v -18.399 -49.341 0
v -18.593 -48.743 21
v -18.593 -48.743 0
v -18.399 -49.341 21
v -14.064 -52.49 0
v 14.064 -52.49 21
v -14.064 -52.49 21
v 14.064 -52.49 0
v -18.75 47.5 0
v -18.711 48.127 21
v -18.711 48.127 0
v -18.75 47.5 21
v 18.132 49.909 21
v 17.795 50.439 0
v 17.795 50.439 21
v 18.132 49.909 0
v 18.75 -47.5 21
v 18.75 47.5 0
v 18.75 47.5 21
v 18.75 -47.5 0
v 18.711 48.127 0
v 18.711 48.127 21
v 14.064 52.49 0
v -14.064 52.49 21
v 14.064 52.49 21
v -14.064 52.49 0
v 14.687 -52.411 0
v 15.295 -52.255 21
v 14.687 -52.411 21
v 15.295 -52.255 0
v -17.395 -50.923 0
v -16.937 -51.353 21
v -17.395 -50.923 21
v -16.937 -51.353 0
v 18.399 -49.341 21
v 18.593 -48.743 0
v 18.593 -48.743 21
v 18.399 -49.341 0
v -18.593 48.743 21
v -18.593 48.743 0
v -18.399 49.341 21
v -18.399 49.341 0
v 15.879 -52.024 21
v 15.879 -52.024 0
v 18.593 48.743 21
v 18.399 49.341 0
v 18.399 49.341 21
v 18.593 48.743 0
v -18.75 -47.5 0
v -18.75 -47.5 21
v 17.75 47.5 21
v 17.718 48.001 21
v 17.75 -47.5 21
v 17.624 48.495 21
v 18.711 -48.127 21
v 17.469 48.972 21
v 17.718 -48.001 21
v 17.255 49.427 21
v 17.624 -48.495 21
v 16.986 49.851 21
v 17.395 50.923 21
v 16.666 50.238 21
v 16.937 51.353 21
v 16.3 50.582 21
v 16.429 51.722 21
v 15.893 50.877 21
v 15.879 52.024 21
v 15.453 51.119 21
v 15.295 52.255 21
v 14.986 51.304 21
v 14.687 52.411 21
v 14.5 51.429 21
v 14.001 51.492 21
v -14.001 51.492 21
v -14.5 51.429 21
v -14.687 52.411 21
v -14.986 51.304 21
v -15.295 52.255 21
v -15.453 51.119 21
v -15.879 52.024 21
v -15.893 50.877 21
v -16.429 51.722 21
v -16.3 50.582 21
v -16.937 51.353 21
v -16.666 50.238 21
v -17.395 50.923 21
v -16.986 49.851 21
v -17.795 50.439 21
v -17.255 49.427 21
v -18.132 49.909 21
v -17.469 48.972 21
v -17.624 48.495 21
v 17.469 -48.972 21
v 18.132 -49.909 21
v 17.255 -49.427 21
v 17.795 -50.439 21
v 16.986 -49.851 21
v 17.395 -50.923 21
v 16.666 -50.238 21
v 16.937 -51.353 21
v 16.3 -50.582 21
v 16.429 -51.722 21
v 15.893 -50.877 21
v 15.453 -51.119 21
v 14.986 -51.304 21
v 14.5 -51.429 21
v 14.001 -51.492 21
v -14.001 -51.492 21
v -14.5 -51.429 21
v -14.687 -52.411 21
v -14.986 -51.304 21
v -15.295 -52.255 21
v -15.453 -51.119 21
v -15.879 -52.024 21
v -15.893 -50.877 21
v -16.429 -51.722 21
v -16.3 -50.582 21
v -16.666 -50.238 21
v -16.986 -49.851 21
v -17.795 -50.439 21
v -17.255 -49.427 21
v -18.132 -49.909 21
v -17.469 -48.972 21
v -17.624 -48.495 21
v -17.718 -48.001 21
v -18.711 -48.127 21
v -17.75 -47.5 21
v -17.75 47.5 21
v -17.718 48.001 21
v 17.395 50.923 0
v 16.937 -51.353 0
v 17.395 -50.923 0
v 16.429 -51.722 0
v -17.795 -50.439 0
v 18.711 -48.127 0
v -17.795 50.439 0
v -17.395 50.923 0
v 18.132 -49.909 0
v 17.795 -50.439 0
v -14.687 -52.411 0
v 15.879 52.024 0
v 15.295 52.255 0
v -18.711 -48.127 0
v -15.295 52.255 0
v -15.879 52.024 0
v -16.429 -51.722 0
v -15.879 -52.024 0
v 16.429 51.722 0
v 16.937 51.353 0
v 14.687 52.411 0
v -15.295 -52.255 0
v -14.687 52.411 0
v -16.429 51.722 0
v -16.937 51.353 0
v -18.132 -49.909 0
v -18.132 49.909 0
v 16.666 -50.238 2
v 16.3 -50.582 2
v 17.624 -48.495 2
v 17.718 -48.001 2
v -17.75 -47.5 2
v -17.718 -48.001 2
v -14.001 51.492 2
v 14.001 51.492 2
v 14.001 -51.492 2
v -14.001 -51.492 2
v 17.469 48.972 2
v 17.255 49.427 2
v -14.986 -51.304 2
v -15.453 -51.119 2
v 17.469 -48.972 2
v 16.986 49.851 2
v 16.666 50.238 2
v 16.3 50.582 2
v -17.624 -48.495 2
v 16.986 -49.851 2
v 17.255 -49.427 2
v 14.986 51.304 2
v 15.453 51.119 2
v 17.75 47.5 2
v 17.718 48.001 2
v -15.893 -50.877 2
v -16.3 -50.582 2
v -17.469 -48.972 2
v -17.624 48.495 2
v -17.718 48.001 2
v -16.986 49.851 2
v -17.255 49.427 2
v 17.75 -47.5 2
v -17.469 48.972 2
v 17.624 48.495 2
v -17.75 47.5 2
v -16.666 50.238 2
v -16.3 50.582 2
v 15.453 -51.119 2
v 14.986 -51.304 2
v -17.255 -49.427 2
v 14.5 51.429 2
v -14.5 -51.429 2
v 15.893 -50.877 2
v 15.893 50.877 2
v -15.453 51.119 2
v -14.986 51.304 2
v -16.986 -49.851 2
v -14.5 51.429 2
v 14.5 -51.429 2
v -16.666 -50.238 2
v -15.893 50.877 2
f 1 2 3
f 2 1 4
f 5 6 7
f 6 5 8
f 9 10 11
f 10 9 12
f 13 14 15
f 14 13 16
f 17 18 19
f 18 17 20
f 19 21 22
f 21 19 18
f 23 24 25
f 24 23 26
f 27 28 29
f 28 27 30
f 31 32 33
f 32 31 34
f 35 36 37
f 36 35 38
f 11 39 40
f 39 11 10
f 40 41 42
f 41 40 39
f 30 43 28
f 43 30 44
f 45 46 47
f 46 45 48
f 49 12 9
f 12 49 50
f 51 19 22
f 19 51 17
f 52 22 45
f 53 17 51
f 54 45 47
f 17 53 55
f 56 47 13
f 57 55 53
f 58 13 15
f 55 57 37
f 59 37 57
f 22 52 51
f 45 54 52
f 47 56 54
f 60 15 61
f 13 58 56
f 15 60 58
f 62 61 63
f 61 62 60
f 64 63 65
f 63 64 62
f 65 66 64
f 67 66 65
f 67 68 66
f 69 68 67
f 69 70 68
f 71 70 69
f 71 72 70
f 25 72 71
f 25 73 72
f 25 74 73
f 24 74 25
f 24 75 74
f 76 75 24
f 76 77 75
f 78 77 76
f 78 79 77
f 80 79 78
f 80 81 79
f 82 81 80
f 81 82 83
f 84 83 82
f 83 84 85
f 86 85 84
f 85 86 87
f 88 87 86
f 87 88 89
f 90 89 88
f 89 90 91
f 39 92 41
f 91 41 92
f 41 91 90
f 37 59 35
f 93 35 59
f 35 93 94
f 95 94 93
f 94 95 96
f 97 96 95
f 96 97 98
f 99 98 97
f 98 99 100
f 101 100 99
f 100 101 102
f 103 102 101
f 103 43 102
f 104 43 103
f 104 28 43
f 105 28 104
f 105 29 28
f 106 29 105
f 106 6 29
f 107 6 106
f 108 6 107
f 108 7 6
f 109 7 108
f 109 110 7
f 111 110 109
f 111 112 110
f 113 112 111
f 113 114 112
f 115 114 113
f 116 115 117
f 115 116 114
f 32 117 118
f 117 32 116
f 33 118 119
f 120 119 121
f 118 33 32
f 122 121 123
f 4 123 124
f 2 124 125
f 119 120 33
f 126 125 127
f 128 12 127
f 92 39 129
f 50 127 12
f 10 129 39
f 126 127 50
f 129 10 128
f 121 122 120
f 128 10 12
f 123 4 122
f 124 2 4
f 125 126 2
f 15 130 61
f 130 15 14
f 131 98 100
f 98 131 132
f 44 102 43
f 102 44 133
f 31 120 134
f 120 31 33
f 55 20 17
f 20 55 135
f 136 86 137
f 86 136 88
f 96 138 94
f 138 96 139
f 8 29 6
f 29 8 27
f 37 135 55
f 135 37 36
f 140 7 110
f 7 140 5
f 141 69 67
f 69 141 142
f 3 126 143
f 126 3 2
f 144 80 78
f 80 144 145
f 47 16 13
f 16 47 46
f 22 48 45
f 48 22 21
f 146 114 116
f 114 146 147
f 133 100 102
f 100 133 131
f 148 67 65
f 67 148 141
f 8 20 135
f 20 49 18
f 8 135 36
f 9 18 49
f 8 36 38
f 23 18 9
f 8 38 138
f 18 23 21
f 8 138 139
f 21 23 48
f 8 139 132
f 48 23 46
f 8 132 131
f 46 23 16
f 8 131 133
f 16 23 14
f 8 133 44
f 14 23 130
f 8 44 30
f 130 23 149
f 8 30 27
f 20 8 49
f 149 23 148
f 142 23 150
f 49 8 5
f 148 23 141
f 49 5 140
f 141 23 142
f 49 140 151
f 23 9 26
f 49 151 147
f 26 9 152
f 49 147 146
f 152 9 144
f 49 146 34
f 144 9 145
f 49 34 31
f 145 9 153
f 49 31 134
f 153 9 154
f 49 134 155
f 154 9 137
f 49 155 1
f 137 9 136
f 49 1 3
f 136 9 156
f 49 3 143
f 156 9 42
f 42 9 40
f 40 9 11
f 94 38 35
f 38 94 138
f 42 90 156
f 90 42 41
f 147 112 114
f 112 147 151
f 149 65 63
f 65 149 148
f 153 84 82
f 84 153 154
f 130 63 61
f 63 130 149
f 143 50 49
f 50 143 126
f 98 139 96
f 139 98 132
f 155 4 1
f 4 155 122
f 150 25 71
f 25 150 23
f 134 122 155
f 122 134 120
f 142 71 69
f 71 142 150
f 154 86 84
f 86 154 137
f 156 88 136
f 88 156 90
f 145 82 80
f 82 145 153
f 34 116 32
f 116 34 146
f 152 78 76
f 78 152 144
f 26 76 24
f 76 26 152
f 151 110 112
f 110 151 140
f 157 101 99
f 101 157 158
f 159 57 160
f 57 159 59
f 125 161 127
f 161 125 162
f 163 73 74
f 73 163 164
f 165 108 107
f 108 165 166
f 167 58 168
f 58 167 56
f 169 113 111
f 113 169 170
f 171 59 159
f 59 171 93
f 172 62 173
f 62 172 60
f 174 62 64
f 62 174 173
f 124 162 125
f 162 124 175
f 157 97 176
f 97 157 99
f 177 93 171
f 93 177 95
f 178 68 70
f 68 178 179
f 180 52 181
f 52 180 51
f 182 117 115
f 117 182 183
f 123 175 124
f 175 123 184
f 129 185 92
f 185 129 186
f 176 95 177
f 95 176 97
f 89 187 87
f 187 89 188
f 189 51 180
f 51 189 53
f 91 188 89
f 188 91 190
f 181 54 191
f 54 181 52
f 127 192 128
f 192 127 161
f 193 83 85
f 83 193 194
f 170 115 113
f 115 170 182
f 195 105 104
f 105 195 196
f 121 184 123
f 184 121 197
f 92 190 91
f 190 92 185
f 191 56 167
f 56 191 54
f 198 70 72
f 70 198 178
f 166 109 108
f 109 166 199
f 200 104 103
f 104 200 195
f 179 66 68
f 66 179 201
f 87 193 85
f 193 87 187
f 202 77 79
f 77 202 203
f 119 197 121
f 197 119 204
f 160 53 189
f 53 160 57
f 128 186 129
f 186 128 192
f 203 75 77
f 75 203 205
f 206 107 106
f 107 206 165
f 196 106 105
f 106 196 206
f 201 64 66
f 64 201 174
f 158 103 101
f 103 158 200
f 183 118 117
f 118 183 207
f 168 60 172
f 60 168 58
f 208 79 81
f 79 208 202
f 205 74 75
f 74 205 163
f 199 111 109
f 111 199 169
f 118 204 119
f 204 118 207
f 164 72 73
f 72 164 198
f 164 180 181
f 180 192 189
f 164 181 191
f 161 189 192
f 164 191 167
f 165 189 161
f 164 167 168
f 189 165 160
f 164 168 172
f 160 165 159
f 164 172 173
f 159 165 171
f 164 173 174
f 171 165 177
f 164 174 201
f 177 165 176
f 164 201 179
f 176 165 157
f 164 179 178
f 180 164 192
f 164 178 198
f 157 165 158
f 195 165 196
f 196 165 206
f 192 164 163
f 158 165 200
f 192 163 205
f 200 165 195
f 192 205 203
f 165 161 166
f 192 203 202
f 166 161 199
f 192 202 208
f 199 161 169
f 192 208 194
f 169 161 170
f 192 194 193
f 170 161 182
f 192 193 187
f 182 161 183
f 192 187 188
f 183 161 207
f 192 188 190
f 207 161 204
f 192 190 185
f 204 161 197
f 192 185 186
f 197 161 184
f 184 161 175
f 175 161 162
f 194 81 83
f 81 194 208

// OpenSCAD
$fn = 50;


difference() {
	union() {
		hull() {
			translate(v = [-13.7500000000, 47.5000000000, 0]) {
				cylinder(h = 21, r = 5);
			}
			translate(v = [13.7500000000, 47.5000000000, 0]) {
				cylinder(h = 21, r = 5);
			}
			translate(v = [-13.7500000000, -47.5000000000, 0]) {
				cylinder(h = 21, r = 5);
			}
			translate(v = [13.7500000000, -47.5000000000, 0]) {
				cylinder(h = 21, r = 5);
			}
		}
	}
	union() {
		translate(v = [0, 0, 2]) {
			hull() {
				translate(v = [-13.7500000000, 47.5000000000, 0]) {
					cylinder(h = 19, r = 4);
				}
				translate(v = [13.7500000000, 47.5000000000, 0]) {
					cylinder(h = 19, r = 4);
				}
				translate(v = [-13.7500000000, -47.5000000000, 0]) {
					cylinder(h = 19, r = 4);
				}
				translate(v = [13.7500000000, -47.5000000000, 0]) {
					cylinder(h = 19, r = 4);
				}
			}
		}
	}
}
